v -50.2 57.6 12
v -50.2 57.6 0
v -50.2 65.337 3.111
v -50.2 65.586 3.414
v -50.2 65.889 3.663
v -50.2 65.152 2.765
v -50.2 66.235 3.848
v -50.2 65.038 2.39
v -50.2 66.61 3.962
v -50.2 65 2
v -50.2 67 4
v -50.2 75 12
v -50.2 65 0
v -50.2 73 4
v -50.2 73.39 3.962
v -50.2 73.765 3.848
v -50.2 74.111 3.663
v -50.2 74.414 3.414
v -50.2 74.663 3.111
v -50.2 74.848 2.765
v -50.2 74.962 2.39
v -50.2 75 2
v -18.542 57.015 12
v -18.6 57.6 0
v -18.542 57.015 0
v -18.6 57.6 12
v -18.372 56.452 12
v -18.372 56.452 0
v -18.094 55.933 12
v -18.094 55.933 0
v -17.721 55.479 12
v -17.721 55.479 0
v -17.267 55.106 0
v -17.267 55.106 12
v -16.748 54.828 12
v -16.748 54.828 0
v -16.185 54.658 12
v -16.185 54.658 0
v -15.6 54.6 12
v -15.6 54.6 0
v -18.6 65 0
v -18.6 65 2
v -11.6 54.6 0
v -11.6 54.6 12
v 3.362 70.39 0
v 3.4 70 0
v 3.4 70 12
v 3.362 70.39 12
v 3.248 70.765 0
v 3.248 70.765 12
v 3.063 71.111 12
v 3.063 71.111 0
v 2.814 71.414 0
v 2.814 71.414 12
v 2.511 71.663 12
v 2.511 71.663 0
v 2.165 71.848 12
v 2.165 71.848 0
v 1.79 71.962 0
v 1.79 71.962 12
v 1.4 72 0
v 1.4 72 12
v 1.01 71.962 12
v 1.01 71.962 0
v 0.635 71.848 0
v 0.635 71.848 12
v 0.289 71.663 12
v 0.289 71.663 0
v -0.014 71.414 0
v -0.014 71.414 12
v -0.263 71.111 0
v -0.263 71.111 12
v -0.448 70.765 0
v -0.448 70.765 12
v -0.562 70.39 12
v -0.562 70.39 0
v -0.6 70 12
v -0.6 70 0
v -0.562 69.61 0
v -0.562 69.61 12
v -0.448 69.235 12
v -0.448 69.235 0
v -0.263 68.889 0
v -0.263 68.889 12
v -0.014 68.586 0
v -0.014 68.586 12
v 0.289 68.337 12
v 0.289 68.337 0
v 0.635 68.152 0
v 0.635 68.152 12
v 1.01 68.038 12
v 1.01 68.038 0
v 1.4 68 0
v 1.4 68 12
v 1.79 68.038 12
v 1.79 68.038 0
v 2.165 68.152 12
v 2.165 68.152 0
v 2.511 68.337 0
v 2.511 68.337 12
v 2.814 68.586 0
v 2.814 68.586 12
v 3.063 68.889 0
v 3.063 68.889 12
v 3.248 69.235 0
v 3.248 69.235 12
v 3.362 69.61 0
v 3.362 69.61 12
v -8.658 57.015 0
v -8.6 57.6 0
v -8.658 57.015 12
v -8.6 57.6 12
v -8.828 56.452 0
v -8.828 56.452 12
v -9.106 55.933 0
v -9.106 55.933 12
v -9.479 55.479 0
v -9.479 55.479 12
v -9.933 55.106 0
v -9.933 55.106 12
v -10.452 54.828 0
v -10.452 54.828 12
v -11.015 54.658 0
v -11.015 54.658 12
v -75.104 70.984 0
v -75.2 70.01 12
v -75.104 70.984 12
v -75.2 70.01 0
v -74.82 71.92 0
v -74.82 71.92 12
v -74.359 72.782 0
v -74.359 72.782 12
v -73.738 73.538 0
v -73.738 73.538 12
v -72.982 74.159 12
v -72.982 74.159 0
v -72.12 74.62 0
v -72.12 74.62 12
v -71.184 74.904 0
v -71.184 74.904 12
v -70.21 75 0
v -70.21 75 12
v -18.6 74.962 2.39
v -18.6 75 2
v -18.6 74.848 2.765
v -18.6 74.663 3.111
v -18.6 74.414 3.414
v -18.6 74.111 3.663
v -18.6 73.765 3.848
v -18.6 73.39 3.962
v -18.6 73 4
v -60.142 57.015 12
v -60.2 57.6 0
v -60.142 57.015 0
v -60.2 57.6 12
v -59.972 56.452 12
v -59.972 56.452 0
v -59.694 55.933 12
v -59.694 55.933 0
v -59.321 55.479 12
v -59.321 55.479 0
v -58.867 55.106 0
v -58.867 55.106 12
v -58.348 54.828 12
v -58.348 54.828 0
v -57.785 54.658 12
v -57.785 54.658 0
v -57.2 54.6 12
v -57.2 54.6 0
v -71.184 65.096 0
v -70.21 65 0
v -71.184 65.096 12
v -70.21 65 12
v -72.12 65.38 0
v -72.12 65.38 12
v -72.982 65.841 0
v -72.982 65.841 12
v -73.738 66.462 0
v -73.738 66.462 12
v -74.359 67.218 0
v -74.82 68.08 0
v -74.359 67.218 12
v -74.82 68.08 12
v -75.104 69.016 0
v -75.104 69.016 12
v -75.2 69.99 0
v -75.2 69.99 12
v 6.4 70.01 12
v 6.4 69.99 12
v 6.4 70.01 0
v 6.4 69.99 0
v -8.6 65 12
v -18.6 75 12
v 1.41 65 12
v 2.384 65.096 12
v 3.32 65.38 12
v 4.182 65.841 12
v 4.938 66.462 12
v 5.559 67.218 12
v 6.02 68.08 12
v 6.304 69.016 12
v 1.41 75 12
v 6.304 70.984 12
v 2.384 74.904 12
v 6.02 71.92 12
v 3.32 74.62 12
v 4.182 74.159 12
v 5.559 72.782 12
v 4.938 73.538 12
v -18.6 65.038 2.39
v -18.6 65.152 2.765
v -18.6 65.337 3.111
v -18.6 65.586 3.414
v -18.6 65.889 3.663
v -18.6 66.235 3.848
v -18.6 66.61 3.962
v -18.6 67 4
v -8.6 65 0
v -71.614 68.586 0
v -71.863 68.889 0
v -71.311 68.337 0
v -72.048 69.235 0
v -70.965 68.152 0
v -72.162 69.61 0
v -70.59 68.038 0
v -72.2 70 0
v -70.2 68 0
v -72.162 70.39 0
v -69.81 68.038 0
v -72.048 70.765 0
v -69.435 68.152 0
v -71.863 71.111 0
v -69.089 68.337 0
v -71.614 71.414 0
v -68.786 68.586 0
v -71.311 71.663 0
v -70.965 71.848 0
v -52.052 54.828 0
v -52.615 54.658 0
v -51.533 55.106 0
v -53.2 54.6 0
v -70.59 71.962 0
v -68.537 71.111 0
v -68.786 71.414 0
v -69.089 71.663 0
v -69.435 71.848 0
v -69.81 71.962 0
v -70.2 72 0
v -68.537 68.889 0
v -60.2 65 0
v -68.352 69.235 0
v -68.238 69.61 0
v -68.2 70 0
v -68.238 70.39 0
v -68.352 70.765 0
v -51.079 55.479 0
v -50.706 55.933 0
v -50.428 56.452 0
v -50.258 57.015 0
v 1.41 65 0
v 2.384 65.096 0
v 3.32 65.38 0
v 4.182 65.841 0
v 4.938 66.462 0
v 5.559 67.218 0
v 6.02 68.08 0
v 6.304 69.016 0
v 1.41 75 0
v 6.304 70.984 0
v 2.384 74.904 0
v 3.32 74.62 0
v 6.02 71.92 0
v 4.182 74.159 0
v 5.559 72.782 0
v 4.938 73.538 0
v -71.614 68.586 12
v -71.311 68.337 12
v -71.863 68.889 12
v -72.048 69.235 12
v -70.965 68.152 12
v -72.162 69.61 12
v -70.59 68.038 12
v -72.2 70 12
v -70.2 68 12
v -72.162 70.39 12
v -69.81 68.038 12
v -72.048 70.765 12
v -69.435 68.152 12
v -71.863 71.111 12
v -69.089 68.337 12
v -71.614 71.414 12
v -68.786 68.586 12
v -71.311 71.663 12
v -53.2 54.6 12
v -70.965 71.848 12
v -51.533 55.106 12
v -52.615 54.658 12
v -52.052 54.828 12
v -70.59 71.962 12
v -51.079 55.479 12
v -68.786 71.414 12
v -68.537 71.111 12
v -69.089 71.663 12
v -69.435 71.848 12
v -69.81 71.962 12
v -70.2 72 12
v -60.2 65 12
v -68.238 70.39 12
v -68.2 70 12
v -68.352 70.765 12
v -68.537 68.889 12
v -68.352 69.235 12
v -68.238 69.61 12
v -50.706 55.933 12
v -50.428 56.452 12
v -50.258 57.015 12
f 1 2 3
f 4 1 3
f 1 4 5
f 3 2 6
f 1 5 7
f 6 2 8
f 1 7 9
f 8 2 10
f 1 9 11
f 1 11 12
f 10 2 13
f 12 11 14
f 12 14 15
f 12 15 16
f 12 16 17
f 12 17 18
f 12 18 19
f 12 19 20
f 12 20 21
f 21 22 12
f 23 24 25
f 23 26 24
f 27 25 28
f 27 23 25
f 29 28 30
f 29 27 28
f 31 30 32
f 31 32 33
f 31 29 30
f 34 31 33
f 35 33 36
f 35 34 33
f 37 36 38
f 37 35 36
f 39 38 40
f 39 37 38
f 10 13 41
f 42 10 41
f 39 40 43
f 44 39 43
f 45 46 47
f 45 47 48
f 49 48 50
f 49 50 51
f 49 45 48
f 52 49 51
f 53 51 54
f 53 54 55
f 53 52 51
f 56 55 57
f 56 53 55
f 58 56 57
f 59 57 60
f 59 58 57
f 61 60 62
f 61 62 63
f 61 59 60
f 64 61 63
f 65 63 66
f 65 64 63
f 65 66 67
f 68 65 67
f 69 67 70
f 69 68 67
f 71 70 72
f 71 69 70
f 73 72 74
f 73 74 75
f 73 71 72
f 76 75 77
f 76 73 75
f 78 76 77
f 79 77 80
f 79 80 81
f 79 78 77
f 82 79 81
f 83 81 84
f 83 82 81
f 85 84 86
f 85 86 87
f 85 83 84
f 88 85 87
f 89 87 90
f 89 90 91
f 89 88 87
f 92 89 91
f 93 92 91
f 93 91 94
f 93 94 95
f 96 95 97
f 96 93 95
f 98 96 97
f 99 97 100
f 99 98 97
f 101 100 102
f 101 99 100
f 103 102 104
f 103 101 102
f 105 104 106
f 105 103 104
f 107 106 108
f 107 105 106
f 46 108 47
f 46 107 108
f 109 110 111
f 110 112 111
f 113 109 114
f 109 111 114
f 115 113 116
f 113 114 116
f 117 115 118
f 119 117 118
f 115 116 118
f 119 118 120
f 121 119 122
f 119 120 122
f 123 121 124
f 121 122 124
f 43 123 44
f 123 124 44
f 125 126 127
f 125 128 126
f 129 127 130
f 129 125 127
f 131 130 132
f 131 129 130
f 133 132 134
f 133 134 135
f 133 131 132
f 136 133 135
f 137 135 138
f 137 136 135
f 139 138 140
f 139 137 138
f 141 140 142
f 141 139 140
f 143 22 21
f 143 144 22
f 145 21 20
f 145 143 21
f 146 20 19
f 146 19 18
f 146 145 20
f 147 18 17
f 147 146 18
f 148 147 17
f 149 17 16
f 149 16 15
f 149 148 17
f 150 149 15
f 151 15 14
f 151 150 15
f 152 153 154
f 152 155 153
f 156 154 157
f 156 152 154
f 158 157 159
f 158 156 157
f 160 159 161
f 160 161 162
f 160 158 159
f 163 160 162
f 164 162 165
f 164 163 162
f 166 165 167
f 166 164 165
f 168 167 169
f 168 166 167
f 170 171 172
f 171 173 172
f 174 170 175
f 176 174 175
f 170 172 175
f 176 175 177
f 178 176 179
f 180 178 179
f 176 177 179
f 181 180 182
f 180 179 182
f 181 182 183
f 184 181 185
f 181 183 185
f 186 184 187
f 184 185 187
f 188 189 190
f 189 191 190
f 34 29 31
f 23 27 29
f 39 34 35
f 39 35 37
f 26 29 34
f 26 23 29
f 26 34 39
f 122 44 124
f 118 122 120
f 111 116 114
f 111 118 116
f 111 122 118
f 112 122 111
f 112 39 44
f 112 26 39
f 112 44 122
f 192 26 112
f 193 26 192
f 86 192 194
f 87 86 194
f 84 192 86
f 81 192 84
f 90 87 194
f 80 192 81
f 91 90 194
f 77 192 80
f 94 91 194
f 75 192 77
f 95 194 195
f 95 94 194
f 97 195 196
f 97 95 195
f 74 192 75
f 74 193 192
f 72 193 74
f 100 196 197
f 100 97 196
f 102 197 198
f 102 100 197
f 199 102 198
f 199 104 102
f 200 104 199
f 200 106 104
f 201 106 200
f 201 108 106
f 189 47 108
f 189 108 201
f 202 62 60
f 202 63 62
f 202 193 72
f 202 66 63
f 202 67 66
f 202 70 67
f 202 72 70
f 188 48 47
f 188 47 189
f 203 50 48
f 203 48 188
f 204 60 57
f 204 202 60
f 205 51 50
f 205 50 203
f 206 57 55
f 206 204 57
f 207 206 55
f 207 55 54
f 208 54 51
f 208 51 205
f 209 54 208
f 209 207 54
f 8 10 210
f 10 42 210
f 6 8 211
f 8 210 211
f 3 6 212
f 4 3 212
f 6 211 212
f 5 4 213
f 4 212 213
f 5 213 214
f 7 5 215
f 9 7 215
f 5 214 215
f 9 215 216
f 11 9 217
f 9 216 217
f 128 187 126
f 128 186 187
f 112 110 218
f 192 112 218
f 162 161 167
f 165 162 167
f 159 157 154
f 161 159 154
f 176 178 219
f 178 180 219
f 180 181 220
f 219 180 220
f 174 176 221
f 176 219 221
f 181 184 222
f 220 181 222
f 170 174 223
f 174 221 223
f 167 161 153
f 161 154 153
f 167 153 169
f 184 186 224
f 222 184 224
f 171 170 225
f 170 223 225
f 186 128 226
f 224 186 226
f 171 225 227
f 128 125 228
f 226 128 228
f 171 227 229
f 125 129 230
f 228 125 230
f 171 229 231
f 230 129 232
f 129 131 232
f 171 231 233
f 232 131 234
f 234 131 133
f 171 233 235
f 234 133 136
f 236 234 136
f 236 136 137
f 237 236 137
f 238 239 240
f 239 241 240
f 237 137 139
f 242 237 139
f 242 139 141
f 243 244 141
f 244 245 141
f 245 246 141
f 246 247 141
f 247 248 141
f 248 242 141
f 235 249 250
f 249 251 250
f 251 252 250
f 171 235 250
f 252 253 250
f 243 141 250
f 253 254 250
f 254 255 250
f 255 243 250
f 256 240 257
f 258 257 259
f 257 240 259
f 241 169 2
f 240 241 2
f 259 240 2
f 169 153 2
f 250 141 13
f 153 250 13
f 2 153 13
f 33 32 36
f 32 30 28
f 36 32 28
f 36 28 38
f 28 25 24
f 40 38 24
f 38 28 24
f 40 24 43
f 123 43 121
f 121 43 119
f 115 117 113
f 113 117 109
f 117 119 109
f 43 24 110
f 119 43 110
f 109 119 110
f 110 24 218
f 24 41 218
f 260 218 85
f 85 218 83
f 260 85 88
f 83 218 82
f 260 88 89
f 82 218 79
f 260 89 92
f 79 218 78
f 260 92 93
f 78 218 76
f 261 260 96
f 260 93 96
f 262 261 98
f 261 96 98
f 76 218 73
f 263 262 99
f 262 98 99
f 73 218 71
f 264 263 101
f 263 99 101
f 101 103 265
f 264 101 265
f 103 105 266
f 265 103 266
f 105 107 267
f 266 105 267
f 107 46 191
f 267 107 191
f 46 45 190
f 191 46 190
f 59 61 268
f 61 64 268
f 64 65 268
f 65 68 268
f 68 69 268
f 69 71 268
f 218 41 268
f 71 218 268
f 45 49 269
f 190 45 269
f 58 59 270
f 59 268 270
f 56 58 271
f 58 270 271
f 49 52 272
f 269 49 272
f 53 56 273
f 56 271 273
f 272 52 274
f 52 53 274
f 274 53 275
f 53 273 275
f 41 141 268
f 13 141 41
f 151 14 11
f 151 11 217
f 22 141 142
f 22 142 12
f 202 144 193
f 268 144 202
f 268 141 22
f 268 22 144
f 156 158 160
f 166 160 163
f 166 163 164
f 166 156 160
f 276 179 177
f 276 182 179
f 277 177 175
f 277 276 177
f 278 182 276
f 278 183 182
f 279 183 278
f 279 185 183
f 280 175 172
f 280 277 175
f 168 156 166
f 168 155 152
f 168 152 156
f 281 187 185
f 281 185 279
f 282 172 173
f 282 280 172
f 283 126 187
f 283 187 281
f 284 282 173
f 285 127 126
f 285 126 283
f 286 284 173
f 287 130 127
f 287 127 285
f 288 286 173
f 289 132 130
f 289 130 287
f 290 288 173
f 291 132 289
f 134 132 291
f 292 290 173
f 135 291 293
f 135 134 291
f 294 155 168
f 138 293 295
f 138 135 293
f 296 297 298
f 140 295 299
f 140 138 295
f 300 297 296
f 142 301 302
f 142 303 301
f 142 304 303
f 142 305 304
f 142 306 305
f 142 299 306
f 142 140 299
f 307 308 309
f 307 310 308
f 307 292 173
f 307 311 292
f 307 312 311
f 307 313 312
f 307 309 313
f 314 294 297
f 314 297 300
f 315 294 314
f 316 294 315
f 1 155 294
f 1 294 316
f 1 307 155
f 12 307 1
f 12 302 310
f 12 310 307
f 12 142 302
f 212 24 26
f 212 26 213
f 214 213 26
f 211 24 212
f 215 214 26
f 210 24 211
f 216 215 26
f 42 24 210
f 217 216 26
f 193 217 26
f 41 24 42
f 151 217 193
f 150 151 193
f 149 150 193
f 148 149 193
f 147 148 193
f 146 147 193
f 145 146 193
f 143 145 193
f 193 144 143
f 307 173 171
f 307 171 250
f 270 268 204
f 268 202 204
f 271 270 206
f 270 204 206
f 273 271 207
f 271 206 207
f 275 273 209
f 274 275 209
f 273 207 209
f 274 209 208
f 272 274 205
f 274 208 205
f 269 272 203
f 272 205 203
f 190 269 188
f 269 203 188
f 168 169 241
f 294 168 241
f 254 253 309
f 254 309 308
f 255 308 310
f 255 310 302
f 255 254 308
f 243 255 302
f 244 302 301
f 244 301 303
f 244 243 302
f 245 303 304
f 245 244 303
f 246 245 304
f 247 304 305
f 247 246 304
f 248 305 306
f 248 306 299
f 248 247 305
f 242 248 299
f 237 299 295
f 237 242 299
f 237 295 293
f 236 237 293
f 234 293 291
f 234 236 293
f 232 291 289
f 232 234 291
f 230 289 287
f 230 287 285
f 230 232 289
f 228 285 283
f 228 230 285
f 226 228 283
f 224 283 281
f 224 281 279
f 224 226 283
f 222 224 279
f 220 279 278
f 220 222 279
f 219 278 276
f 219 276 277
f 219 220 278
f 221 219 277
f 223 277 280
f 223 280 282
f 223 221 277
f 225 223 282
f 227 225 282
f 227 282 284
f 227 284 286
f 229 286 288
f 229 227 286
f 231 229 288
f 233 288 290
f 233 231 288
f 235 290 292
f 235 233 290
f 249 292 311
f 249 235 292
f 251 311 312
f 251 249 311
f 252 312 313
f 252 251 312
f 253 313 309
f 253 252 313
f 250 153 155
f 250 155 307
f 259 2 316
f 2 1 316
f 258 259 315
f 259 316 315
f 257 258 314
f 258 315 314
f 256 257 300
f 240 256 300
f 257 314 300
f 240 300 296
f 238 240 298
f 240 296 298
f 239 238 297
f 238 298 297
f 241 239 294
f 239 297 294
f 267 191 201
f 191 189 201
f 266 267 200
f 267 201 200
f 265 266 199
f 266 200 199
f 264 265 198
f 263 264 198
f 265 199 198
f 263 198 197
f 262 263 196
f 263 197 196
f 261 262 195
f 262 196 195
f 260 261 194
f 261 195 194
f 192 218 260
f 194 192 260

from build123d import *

# Parameters (mm, degrees)
CYLINDER264_R     = 2
CYLINDER264_DEPTH = 12
CYLINDER265_R     = 2
CYLINDER265_DEPTH = 12
BOX423_W          = 25
BOX423_H          = 10
BOX423_DEPTH      = 12
BOX424_W          = 25
BOX424_H          = 10
BOX424_DEPTH      = 12
BOX425_W          = 10
BOX425_H          = 20.4
BOX425_DEPTH      = 12
BOX426_W          = 10
BOX426_H          = 20.4
BOX426_DEPTH      = 12
BOX422_W          = 81.6
BOX422_H          = 10
BOX422_DEPTH      = 4
FILLET010_R       = 4.99
FILLET011_R       = 4.99
FILLET012_R       = 3
FILLET013_R       = 2


with BuildPart() as cylinder264:
    # Cylinder264 → Cylinder264 (new body)
    with BuildSketch(Plane(origin=(1.4, 70, 0), x_dir=(1, 0, 0), z_dir=(0, 0, 1))):
        Circle(CYLINDER264_R)
    extrude(amount=CYLINDER264_DEPTH)


with BuildPart() as fusion270:
    # Cylinder265 → Cylinder265 (new body)
    with BuildSketch(Plane(origin=(-70.2, 70, 0), x_dir=(1, 0, 0), z_dir=(0, 0, 1))):
        Circle(CYLINDER265_R)
    extrude(amount=CYLINDER265_DEPTH)

    # Fusion270: union Cylinder264
    add(cylinder264.part)


with BuildPart() as box423:
    # Box423 → Box423 (new body)
    with BuildSketch(Plane(origin=(-75.2, 65, 0), x_dir=(1, 0, 0), z_dir=(0, 0, 1))):
        with Locations((12.5, 5)):
            Rectangle(BOX423_W, BOX423_H)
    extrude(amount=BOX423_DEPTH)


with BuildPart() as box424:
    # Box424 → Box424 (new body)
    with BuildSketch(Plane(origin=(-18.6, 65, 0), x_dir=(1, 0, 0), z_dir=(0, 0, 1))):
        with Locations((12.5, 5)):
            Rectangle(BOX424_W, BOX424_H)
    extrude(amount=BOX424_DEPTH)


with BuildPart() as box425:
    # Box425 → Box425 (new body)
    with BuildSketch(Plane(origin=(-60.2, 54.6, 0), x_dir=(1, 0, 0), z_dir=(0, 0, 1))):
        with Locations((5, 10.2)):
            Rectangle(BOX425_W, BOX425_H)
    extrude(amount=BOX425_DEPTH)


with BuildPart() as box426:
    # Box426 → Box426 (new body)
    with BuildSketch(Plane(origin=(-18.6, 54.6, 0), x_dir=(1, 0, 0), z_dir=(0, 0, 1))):
        with Locations((5, 10.2)):
            Rectangle(BOX426_W, BOX426_H)
    extrude(amount=BOX426_DEPTH)


with BuildPart() as cut414:
    # Box422 → Box422 (new body)
    with BuildSketch(Plane(origin=(-75.2, 65, 0), x_dir=(1, 0, 0), z_dir=(0, 0, 1))):
        with Locations((40.8, 5)):
            Rectangle(BOX422_W, BOX422_H)
    extrude(amount=BOX422_DEPTH)

    # Fusion269: union Box423, Box424, Box425, Box426
    add(box423.part)
    add(box424.part)
    add(box425.part)
    add(box426.part)

    # Fillet010
    fillet010_edges = [cut414.edges().sort_by_distance(p)[0] for p in [
        (-75.2, 65, 8),
        (-75.2, 75, 8),
    ]]
    fillet(fillet010_edges, radius=FILLET010_R)

    # Fillet011
    fillet011_edges = [cut414.edges().sort_by_distance(p)[0] for p in [
        (6.4, 75, 8),
        (6.4, 65, 8),
    ]]
    fillet(fillet011_edges, radius=FILLET011_R)

    # Fillet012
    fillet012_edges = [cut414.edges().sort_by_distance(p)[0] for p in [
        (-8.6, 54.6, 6),
        (-18.6, 54.6, 6),
        (-50.2, 54.6, 6),
        (-60.2, 54.6, 6),
    ]]
    fillet(fillet012_edges, radius=FILLET012_R)

    # Fillet013
    fillet013_edges = [cut414.edges().sort_by_distance(p)[0] for p in [
        (-34.4, 65, 4),
        (-34.4, 75, 4),
    ]]
    fillet(fillet013_edges, radius=FILLET013_R)

    # Cut414: cut Fusion270
    add(fusion270.part, mode=Mode.SUBTRACT)


solid = cut414.part
